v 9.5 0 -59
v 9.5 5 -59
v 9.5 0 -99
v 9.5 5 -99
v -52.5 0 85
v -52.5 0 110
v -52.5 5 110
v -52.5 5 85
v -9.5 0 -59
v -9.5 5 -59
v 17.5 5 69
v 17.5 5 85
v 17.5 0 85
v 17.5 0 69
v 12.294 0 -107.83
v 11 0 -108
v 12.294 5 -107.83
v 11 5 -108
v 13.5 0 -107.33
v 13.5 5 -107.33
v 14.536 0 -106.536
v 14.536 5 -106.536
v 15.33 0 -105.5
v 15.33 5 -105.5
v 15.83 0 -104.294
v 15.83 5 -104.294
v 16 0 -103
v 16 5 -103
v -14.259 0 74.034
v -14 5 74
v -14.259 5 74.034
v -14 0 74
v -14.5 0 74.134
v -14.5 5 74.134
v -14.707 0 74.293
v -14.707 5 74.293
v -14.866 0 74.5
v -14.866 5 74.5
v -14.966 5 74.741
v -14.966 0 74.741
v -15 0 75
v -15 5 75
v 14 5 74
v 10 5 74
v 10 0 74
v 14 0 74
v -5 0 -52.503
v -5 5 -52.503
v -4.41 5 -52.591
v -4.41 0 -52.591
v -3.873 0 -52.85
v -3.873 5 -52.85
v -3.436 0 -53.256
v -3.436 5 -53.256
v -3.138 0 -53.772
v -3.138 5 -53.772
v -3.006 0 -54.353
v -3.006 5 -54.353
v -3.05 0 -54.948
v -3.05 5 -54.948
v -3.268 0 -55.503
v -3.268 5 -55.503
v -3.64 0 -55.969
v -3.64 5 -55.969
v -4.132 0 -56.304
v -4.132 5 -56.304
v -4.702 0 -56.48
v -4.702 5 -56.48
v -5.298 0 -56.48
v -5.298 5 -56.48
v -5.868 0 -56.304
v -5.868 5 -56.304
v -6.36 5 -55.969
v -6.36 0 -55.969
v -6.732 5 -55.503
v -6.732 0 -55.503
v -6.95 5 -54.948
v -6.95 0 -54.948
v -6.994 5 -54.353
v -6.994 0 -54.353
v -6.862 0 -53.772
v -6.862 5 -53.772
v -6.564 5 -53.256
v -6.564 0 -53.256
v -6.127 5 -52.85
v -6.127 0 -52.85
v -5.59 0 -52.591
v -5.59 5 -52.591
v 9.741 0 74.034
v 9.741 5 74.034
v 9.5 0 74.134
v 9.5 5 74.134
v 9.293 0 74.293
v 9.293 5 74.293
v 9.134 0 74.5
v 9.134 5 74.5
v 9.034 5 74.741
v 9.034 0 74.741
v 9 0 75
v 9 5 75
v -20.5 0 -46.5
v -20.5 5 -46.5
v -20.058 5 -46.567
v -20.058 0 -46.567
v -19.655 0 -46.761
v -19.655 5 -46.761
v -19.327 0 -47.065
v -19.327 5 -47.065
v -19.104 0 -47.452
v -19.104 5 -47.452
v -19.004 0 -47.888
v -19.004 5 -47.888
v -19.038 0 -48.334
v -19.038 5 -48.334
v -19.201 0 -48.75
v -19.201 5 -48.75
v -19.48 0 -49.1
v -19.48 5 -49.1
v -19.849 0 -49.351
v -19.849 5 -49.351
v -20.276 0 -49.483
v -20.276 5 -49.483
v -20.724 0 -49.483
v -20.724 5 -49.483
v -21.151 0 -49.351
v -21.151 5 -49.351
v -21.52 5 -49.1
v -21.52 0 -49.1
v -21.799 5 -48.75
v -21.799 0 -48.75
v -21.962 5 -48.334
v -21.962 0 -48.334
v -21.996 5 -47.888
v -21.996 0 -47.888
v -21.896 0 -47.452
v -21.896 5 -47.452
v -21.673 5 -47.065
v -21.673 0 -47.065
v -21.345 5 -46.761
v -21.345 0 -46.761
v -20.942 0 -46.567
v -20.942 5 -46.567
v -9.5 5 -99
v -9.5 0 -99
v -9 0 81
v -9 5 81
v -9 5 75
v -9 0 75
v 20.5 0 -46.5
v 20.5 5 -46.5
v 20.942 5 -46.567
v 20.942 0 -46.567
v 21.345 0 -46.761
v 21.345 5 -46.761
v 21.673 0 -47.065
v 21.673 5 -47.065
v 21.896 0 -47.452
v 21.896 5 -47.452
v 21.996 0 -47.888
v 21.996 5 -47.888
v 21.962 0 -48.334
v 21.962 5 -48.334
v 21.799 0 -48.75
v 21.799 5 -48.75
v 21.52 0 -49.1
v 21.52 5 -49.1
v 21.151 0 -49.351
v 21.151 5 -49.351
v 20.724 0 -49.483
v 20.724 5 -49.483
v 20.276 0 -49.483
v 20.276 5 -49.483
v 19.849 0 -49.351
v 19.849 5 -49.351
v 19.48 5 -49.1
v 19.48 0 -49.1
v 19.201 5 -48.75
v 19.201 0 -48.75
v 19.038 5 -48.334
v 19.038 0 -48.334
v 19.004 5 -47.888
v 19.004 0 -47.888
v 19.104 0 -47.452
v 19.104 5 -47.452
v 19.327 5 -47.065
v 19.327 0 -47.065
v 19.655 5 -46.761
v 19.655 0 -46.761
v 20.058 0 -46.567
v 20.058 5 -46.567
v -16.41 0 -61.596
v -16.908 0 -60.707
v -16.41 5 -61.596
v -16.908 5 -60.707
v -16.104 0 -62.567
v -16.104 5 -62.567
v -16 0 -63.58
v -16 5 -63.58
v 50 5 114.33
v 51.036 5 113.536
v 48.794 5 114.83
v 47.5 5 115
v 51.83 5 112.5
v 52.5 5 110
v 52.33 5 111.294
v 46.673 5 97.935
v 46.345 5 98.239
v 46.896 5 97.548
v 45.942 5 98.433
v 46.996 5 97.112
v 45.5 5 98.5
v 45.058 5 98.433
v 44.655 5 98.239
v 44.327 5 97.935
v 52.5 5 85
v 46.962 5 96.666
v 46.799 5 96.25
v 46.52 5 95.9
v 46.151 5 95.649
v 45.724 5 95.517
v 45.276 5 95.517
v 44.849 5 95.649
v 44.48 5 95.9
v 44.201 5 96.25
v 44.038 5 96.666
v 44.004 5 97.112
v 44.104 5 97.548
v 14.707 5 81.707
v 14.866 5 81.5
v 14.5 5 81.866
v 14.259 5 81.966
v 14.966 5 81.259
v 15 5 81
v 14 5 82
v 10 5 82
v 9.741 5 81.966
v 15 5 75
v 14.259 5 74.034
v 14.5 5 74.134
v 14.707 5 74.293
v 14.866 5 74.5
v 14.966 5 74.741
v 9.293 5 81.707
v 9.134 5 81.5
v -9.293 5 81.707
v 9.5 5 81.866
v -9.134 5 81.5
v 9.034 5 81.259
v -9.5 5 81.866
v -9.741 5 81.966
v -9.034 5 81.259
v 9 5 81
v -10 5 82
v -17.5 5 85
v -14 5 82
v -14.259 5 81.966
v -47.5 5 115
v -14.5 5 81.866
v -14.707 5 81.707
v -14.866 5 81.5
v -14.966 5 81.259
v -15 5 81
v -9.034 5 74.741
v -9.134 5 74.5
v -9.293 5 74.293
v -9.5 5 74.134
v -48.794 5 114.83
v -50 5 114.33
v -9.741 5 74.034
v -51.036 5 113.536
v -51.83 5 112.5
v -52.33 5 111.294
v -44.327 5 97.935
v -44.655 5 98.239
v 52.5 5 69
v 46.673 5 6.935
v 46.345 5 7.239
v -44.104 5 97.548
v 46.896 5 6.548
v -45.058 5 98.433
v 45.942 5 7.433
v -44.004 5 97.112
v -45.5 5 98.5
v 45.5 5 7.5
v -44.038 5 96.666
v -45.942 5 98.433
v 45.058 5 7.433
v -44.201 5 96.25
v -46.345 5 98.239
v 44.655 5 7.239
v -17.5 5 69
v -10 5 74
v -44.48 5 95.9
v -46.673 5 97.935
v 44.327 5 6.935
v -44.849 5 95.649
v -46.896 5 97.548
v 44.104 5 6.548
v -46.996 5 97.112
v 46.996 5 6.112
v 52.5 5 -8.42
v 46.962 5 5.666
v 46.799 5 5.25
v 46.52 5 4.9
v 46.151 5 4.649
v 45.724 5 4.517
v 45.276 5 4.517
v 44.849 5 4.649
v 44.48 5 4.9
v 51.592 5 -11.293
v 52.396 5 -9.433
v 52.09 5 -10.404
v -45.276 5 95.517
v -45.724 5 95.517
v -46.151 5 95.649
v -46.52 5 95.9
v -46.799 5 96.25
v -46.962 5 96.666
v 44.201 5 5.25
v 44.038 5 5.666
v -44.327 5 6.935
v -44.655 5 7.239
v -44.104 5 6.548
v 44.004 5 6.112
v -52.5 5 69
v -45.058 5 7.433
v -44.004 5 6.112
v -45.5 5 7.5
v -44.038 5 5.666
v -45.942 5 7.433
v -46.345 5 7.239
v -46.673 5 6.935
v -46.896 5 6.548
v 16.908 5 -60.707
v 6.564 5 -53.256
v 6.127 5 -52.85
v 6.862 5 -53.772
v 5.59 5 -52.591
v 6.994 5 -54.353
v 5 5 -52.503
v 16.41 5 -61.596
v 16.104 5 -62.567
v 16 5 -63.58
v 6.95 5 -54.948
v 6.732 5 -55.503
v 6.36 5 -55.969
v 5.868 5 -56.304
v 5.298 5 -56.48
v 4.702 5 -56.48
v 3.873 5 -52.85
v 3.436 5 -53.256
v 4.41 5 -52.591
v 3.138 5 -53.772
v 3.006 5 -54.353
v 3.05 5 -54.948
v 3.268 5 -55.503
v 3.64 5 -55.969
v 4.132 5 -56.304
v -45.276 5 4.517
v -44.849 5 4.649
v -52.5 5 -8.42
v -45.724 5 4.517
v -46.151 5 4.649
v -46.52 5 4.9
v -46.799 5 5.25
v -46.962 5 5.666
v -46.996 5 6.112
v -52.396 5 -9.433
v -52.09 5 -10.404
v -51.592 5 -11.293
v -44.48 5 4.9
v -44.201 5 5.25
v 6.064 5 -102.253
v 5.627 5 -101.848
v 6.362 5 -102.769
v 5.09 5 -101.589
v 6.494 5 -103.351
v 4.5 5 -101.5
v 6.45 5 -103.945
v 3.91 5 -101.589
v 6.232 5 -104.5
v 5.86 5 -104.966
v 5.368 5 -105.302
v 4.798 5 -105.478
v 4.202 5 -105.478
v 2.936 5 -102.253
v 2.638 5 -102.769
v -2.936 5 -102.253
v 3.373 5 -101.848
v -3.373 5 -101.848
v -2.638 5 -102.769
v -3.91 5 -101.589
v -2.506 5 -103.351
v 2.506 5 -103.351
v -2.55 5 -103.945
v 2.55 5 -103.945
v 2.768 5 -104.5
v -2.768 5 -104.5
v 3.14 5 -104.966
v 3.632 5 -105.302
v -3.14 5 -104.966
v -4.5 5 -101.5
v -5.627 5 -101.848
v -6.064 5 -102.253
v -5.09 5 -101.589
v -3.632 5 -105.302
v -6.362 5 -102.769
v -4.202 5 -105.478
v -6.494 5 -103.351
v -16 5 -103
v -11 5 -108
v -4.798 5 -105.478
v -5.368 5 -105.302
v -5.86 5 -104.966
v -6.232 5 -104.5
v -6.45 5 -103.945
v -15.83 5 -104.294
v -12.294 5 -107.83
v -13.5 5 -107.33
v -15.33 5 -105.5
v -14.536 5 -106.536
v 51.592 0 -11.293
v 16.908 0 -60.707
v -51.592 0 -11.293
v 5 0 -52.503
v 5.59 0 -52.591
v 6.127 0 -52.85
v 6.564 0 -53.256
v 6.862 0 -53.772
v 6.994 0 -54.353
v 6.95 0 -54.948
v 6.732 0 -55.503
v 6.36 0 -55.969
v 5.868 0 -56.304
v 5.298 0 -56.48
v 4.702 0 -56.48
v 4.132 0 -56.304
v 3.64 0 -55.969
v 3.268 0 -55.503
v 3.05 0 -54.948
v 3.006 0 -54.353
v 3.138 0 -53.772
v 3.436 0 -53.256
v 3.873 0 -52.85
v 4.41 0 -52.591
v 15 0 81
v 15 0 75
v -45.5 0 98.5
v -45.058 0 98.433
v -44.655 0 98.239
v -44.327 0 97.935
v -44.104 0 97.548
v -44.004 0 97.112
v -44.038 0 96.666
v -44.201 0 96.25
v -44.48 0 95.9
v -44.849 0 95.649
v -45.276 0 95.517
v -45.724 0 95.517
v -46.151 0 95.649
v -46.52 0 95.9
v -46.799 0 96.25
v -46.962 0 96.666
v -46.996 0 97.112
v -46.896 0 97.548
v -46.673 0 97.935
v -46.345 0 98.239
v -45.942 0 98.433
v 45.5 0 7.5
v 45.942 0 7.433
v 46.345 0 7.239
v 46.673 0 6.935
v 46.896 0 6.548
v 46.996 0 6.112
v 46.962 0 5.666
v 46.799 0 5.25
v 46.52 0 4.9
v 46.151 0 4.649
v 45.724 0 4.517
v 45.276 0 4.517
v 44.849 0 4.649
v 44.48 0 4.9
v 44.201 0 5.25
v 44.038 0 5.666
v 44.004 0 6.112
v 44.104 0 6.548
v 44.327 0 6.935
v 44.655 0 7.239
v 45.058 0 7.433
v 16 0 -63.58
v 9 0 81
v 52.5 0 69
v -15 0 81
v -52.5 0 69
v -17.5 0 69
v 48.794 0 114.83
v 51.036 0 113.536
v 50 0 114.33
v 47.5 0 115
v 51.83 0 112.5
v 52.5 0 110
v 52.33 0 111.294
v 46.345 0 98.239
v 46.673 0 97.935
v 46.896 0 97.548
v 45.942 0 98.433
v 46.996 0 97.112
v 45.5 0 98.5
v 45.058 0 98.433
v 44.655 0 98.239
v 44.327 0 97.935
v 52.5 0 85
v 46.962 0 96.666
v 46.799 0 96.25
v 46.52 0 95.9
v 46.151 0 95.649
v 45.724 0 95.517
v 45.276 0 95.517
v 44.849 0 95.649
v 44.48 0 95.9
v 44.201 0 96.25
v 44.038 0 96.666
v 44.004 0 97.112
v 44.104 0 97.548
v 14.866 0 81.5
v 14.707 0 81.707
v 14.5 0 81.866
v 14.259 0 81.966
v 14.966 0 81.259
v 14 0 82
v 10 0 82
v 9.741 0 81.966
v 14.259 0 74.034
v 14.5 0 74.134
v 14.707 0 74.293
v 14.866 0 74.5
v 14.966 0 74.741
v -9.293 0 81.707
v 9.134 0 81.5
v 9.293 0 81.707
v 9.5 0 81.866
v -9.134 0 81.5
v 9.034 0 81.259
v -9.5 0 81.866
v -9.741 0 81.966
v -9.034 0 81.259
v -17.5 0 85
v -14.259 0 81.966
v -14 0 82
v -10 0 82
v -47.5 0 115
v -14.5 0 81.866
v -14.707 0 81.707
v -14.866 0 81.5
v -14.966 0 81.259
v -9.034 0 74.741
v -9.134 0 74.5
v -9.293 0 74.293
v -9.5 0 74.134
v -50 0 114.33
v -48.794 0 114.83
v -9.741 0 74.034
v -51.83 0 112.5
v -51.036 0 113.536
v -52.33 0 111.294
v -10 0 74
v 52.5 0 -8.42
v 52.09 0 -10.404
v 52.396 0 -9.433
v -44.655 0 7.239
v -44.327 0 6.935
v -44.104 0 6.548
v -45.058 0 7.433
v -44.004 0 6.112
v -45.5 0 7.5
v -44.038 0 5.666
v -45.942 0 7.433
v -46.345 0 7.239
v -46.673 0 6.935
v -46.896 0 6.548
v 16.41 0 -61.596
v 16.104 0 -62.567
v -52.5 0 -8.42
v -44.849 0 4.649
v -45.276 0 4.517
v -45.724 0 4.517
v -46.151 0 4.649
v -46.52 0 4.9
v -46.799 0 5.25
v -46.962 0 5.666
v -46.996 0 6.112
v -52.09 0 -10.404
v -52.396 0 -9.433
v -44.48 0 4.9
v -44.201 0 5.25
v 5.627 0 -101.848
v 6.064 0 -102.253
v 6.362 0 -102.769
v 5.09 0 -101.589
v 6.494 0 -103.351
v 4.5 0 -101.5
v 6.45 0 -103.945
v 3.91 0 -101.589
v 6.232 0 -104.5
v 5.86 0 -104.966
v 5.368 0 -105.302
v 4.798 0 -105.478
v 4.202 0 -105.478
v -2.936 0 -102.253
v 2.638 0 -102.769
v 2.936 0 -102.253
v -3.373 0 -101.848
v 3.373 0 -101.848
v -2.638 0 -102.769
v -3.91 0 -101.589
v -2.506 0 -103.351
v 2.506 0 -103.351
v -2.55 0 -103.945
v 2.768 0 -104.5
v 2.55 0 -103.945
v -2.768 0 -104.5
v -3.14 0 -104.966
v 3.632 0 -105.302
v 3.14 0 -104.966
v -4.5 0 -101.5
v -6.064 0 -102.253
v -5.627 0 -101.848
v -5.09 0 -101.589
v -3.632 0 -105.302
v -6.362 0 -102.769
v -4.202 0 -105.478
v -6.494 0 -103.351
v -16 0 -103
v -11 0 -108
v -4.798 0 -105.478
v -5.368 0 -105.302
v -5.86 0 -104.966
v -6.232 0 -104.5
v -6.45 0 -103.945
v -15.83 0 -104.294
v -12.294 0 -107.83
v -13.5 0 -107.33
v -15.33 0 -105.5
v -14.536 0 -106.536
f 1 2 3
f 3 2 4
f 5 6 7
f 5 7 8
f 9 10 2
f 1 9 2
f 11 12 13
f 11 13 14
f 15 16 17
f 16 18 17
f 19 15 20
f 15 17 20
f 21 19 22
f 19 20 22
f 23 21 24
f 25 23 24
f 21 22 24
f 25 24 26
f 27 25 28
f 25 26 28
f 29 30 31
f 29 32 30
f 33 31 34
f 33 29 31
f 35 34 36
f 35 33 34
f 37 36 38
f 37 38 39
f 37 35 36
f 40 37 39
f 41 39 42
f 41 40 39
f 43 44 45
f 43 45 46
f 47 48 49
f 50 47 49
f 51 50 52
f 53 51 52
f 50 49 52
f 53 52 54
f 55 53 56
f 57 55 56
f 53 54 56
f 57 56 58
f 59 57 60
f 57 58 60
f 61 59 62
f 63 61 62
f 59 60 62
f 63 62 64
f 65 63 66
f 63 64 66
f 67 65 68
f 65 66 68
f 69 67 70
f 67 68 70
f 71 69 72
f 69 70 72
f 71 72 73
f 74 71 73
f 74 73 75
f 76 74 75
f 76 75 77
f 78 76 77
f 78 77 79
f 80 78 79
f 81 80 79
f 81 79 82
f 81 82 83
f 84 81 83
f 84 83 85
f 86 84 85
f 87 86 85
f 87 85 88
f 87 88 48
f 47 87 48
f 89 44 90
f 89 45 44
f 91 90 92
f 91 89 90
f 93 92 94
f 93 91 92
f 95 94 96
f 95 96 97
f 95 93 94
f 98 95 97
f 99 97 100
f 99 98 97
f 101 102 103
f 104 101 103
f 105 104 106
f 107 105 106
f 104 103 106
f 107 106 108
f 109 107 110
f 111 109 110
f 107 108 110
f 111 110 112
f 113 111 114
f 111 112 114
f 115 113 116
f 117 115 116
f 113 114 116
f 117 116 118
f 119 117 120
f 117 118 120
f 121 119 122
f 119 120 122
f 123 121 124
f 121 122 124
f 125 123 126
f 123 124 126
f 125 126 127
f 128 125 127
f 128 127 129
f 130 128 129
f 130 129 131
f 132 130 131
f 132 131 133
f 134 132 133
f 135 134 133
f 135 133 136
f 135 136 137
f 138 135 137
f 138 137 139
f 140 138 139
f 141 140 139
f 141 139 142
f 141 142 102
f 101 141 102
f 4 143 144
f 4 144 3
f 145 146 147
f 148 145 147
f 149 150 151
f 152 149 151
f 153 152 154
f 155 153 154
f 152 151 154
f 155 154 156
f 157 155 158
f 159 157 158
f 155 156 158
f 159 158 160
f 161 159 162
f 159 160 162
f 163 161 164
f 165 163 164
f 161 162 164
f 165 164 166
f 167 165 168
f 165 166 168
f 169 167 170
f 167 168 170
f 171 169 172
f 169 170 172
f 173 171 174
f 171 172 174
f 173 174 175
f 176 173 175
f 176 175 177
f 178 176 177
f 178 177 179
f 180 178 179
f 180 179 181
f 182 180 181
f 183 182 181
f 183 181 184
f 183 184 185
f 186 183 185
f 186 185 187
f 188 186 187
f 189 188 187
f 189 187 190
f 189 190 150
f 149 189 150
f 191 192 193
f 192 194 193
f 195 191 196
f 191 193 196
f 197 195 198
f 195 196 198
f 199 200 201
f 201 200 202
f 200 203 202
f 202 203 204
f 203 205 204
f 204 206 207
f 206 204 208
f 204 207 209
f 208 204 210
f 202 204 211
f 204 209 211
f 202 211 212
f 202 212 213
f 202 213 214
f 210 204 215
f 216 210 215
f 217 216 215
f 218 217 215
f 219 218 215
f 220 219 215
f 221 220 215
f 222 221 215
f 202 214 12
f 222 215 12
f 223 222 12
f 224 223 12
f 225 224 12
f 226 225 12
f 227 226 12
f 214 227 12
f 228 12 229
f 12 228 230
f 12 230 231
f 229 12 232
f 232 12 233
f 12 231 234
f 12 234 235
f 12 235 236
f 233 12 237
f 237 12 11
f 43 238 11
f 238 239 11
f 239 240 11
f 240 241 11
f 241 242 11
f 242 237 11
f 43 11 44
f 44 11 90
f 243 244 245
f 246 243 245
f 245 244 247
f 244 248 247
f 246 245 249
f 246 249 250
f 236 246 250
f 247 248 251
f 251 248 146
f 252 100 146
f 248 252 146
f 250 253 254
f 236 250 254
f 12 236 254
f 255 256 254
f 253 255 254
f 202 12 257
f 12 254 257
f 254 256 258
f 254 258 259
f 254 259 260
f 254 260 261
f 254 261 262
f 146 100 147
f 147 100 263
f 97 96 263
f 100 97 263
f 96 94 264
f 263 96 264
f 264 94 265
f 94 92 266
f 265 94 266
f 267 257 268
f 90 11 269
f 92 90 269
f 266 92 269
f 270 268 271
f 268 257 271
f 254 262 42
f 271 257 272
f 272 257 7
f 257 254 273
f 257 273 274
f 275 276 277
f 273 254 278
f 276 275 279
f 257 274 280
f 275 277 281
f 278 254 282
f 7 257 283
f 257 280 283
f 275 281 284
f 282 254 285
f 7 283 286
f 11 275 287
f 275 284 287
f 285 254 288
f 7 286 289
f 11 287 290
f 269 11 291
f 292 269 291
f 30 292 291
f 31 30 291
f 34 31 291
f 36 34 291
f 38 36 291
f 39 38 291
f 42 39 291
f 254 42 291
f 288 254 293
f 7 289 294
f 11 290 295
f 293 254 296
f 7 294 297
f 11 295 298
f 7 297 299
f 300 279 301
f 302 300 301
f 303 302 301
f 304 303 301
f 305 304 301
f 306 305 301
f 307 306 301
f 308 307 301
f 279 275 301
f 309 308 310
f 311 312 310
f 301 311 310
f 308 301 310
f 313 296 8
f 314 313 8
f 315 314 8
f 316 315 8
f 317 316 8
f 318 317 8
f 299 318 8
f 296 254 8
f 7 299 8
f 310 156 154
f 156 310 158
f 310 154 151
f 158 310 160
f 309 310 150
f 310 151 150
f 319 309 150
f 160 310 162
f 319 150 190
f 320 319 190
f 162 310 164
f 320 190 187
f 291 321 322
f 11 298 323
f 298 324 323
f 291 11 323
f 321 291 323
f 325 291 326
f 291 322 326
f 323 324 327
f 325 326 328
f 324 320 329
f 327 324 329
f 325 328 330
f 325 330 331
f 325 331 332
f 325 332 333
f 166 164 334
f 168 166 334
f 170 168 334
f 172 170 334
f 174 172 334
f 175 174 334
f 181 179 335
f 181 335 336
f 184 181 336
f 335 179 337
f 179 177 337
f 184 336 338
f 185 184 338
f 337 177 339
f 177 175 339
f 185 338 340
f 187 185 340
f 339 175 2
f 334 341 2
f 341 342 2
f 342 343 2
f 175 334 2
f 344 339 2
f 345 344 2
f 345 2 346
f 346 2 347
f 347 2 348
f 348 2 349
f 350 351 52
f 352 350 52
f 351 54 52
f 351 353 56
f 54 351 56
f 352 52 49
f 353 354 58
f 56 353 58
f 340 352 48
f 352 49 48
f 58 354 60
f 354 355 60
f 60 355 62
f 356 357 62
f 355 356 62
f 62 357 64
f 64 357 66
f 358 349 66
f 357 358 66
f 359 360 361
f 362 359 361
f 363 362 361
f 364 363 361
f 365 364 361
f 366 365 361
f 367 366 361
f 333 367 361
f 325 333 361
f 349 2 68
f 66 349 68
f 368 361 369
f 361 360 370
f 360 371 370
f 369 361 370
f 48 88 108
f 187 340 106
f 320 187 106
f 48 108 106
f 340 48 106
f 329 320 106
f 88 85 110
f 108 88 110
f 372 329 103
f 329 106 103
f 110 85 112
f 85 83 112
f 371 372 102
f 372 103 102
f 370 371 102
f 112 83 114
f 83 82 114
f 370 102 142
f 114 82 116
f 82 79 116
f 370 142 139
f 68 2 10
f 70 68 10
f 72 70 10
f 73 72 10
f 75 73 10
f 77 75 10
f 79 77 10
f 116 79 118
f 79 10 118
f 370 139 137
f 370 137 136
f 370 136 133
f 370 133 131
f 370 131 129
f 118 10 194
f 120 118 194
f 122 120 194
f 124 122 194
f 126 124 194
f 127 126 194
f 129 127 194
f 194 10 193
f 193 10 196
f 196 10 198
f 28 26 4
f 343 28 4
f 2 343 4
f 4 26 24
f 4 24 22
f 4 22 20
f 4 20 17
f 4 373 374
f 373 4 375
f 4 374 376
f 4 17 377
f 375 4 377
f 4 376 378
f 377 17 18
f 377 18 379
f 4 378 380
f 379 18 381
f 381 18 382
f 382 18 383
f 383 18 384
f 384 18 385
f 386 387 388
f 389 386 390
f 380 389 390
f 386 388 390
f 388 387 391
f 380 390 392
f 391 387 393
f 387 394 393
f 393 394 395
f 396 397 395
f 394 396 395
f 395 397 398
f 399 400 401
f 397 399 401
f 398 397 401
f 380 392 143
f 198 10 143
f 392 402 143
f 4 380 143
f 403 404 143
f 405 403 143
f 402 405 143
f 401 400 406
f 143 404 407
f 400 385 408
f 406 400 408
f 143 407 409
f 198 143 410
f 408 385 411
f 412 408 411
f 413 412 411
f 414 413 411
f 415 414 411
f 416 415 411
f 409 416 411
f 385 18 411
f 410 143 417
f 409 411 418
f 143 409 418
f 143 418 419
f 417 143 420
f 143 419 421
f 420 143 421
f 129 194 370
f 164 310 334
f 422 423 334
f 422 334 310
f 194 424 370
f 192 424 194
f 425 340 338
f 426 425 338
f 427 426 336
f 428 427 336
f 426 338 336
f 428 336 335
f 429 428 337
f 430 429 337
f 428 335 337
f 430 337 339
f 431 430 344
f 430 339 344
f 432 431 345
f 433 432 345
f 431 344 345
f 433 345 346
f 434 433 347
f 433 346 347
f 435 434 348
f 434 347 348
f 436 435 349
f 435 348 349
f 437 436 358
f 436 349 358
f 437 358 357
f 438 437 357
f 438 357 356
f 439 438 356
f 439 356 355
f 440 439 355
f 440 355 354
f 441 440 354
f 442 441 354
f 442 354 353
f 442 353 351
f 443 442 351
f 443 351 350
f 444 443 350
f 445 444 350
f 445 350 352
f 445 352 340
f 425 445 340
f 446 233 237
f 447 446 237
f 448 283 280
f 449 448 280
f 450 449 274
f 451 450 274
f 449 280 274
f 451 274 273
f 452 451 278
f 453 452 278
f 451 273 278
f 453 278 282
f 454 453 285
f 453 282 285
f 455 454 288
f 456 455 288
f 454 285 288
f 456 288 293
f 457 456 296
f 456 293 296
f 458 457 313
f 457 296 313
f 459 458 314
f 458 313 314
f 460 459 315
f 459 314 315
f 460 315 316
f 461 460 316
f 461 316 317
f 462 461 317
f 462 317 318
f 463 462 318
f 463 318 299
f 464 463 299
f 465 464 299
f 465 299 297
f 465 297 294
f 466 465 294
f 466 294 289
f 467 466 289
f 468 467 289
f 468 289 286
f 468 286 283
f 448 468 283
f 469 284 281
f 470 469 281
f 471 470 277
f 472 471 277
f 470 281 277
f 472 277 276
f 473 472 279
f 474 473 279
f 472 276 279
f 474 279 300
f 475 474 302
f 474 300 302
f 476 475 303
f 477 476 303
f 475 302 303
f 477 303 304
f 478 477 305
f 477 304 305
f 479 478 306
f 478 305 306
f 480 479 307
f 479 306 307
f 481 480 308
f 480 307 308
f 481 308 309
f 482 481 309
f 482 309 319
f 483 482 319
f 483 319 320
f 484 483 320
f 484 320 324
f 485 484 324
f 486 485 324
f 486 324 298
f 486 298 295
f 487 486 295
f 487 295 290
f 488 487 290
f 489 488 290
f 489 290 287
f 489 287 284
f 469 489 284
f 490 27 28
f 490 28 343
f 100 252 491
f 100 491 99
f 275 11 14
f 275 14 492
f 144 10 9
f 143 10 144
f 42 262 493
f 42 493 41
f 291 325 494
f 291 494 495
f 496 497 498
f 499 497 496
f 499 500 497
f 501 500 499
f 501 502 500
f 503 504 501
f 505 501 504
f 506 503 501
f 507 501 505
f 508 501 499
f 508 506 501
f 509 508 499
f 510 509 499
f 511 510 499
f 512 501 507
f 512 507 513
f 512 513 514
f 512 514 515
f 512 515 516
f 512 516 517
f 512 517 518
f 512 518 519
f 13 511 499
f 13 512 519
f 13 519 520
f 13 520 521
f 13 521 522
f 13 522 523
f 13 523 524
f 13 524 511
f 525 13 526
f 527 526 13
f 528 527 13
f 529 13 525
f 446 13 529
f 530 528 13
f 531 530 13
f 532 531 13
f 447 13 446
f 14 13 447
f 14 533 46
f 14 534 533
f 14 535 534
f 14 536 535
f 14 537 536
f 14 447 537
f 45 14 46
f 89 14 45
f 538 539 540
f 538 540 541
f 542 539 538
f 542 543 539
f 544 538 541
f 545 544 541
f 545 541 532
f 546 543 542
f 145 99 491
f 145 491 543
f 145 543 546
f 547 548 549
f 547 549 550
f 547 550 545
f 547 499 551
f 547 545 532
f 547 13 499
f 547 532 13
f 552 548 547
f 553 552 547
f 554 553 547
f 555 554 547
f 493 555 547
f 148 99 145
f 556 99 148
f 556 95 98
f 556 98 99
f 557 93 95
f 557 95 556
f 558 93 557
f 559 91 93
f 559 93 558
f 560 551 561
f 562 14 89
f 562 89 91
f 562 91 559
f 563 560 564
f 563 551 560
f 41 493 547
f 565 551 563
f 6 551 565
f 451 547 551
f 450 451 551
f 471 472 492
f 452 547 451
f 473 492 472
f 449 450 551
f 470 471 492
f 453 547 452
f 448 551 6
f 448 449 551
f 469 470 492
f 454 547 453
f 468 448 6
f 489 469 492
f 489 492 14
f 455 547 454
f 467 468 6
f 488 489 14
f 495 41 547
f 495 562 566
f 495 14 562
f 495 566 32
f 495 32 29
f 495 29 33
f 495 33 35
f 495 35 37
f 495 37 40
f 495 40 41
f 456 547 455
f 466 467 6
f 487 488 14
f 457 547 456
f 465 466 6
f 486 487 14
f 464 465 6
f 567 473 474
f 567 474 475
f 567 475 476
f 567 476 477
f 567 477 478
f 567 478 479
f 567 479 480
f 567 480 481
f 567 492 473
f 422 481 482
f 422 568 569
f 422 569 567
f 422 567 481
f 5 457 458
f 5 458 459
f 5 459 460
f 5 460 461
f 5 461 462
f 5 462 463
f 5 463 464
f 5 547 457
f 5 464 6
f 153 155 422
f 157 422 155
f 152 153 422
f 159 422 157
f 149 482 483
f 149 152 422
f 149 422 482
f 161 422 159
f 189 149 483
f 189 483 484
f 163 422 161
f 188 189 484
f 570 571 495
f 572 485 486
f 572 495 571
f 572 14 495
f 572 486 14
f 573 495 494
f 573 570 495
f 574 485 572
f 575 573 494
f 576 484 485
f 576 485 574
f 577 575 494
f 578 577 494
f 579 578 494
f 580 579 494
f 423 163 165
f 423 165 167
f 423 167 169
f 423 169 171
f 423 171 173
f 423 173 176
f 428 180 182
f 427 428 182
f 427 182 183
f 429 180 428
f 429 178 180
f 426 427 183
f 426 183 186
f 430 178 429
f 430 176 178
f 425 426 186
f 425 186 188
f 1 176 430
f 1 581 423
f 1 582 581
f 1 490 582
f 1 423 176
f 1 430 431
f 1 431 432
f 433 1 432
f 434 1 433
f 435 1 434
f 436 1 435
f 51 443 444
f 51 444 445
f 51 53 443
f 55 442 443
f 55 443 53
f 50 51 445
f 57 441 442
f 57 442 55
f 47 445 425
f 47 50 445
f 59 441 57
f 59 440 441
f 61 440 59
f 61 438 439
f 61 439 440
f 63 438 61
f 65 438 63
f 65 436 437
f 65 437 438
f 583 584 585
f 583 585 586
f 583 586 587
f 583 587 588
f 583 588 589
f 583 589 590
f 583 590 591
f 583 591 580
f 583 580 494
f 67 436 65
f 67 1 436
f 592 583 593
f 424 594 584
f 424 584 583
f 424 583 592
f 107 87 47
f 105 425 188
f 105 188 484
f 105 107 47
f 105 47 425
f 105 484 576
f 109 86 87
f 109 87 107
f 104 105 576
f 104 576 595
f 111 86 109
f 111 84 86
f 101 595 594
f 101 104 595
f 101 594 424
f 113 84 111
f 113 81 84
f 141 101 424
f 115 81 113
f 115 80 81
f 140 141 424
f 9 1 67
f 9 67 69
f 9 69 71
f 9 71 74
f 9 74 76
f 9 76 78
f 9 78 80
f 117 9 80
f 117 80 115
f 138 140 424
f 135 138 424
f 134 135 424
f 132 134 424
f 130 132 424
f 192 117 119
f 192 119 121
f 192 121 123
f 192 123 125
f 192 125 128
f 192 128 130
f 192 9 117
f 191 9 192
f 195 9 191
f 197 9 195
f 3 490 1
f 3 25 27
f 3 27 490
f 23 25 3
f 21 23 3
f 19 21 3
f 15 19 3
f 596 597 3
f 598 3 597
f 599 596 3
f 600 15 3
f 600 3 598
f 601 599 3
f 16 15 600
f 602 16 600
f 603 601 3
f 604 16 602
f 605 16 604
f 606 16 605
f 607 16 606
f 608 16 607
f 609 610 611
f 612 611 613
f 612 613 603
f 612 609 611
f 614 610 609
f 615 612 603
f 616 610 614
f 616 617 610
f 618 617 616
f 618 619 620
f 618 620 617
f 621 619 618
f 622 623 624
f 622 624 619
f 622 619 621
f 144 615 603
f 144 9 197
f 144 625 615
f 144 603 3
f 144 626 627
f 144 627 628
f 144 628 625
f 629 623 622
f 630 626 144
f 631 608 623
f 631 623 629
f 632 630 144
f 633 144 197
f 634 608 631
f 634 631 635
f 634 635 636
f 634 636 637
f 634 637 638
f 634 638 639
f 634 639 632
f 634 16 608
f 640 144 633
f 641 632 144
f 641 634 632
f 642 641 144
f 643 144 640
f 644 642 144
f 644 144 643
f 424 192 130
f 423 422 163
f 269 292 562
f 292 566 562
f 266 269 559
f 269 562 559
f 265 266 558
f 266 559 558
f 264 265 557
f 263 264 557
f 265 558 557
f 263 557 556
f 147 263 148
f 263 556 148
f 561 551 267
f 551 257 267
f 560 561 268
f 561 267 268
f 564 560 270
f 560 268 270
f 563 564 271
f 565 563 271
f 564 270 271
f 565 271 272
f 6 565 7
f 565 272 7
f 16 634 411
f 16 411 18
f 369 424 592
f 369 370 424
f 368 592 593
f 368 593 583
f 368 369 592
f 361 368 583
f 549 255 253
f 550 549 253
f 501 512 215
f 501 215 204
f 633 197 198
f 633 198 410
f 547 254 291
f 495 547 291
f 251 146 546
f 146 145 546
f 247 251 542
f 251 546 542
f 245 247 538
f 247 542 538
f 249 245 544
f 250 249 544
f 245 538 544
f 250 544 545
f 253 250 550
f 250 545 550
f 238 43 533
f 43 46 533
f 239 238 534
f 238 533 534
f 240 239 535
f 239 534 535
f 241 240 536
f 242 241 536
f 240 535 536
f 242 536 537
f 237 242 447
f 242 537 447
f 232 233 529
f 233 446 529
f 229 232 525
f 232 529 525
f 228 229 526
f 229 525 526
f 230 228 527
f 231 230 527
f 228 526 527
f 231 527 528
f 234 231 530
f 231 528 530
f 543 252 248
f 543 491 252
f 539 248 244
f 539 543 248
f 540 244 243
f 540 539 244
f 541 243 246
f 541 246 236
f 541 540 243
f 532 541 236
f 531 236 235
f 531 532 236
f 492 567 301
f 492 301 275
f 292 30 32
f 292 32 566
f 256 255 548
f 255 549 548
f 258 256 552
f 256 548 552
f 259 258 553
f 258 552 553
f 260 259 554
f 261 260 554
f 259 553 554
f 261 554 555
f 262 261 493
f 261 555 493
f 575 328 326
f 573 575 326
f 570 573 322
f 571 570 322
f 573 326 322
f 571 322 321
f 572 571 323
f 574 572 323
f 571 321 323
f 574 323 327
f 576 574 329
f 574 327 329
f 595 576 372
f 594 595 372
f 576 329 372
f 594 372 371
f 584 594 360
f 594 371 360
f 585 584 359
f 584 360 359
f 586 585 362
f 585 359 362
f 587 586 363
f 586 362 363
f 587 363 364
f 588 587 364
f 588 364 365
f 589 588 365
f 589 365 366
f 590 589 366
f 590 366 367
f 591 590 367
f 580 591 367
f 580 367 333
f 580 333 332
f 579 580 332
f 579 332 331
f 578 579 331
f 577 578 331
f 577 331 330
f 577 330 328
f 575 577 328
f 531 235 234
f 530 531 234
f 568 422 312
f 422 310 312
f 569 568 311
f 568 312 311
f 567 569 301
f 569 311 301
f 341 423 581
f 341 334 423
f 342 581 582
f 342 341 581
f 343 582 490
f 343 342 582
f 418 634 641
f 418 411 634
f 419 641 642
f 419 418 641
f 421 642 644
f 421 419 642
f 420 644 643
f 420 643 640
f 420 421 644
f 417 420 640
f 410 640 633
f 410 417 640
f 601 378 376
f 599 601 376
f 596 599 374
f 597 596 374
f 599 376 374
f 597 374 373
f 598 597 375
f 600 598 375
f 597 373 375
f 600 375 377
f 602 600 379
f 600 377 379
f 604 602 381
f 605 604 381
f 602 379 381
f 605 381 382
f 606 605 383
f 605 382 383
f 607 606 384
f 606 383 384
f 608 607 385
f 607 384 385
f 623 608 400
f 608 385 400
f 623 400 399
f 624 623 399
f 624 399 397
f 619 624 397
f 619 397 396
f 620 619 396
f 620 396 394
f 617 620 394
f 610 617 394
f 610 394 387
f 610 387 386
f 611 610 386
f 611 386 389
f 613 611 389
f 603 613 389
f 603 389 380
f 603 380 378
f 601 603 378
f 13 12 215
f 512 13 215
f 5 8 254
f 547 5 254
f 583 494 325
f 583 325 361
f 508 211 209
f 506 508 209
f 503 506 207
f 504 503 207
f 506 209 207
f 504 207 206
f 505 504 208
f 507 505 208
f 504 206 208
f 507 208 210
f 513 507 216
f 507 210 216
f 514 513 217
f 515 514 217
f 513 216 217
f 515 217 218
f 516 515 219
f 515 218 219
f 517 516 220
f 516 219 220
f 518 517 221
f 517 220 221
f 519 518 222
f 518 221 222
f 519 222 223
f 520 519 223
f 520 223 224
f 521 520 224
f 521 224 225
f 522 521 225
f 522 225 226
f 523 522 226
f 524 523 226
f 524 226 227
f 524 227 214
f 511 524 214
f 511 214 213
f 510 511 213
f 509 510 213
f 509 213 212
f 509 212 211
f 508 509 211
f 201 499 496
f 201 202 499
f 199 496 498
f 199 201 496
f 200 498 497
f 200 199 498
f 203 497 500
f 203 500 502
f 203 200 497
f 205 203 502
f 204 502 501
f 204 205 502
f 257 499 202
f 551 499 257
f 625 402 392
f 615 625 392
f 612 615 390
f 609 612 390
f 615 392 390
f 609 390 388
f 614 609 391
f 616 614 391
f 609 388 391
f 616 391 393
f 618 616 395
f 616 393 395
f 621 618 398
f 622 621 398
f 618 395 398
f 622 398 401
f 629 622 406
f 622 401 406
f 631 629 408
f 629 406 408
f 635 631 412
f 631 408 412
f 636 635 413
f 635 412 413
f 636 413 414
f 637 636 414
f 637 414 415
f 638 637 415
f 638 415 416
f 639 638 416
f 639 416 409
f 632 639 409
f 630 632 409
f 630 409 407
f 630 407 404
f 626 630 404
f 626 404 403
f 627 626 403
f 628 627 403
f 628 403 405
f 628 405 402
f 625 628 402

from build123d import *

# Parameters (mm, degrees)
BOSS_EXTRUDE1_DEPTH = 5
SKETCH2_R           = 2
SKETCH2_R_2         = 1.5
SKETCH2_W           = 19
SKETCH2_H           = 40
SKETCH2_W_2         = 35
SKETCH2_H_2         = 16
SKETCH2_W_3         = 6
SKETCH2_H_3         = 8
CUT_EXTRUDE1_DEPTH  = 7
FILLET1_R           = 5
FILLET2_R           = 5
FILLET3_R           = 5
FILLET4_R           = 5
FILLET5_R           = 5
FILLET6_R           = 5
FILLET8_R           = 1
FILLET9_R           = 1
FILLET10_R          = 5


with BuildPart() as part:
    # Sketch1 → Boss-Extrude1 (new body)
    with BuildSketch(Plane(origin=(0, 0, 0), x_dir=(1, 0, 0), z_dir=(0, 1, 0))):
        Polygon((-16, 108), (16, 108), (16, 62), (52.5, 10), (52.5, -115), (-52.5, -115), (-52.5, 10), (-16, 62), align=None)
    extrude(amount=BOSS_EXTRUDE1_DEPTH)

    # Sketch2 → Cut-Extrude1 (cut)
    with BuildSketch(Plane(origin=(0, 5, 0), x_dir=(1, 0, 0), z_dir=(0, 1, 0))):
        with Locations(Location((-4.5, 103.5, 0), (0, 0, 270))):
            Circle(SKETCH2_R)
        with Locations(Location((4.5, 103.5, 0), (0, 0, 270))):
            Circle(SKETCH2_R)
        with Locations(Location((-5, 54.502551087, 0), (0, 0, 270))):
            Circle(SKETCH2_R)
        with Locations(Location((5, 54.502551087, 0), (0, 0, 270))):
            Circle(SKETCH2_R)
        with Locations(Location((-20.5, 48, 0), (0, 0, 270))):
            Circle(SKETCH2_R_2)
        with Locations(Location((20.5, 48, 0), (0, 0, 270))):
            Circle(SKETCH2_R_2)
        with Locations(Location((45.5, -6, 0), (0, 0, 270))):
            Circle(SKETCH2_R_2)
        with Locations(Location((-45.5, -6, 0), (0, 0, 270))):
            Circle(SKETCH2_R_2)
        with Locations(Location((45.5, -97, 0), (0, 0, 270))):
            Circle(SKETCH2_R_2)
        with Locations(Location((-45.5, -97, 0), (0, 0, 270))):
            Circle(SKETCH2_R_2)
        with Locations((0, 79)):
            Rectangle(SKETCH2_W, SKETCH2_H)
        with Locations((-35, -77)):
            Rectangle(SKETCH2_W_2, SKETCH2_H_2)
        with Locations((35, -77)):
            Rectangle(SKETCH2_W_2, SKETCH2_H_2)
        with Locations((-12, -78)):
            Rectangle(SKETCH2_W_3, SKETCH2_H_3)
        with Locations((12, -78)):
            Rectangle(SKETCH2_W_3, SKETCH2_H_3)
    extrude(amount=-CUT_EXTRUDE1_DEPTH, mode=Mode.SUBTRACT)

    # Fillet1
    fillet1_edges = [part.edges().sort_by_distance(p)[0] for p in [
        (16, 2.5, -108),
    ]]
    fillet(fillet1_edges, radius=FILLET1_R)

    # Fillet2
    fillet2_edges = [part.edges().sort_by_distance(p)[0] for p in [
        (-16, 2.5, -108),
    ]]
    fillet(fillet2_edges, radius=FILLET2_R)

    # Fillet3
    fillet3_edges = [part.edges().sort_by_distance(p)[0] for p in [
        (52.5, 2.5, -10),
    ]]
    fillet(fillet3_edges, radius=FILLET3_R)

    # Fillet4
    fillet4_edges = [part.edges().sort_by_distance(p)[0] for p in [
        (-52.5, 2.5, -10),
    ]]
    fillet(fillet4_edges, radius=FILLET4_R)

    # Fillet5
    fillet5_edges = [part.edges().sort_by_distance(p)[0] for p in [
        (52.5, 2.5, 115),
    ]]
    fillet(fillet5_edges, radius=FILLET5_R)

    # Fillet6
    fillet6_edges = [part.edges().sort_by_distance(p)[0] for p in [
        (-52.5, 2.5, 115),
    ]]
    fillet(fillet6_edges, radius=FILLET6_R)

    # Fillet8
    fillet8_edges = [part.edges().sort_by_distance(p)[0] for p in [
        (15, 2.5, 74),
    ]]
    fillet(fillet8_edges, radius=FILLET8_R)

    # Fillet9
    fillet9_edges = [part.edges().sort_by_distance(p)[0] for p in [
        (-15, 2.5, 82),
        (-15, 2.5, 74),
        (-9, 2.5, 74),
        (-9, 2.5, 82),
        (9, 2.5, 74),
        (15, 2.5, 82),
        (9, 2.5, 82),
    ]]
    fillet(fillet9_edges, radius=FILLET9_R)

    # Fillet10
    fillet10_edges = [part.edges().sort_by_distance(p)[0] for p in [
        (16, 2.5, -62),
        (-16, 2.5, -62),
    ]]
    fillet(fillet10_edges, radius=FILLET10_R)


solid = part.part
